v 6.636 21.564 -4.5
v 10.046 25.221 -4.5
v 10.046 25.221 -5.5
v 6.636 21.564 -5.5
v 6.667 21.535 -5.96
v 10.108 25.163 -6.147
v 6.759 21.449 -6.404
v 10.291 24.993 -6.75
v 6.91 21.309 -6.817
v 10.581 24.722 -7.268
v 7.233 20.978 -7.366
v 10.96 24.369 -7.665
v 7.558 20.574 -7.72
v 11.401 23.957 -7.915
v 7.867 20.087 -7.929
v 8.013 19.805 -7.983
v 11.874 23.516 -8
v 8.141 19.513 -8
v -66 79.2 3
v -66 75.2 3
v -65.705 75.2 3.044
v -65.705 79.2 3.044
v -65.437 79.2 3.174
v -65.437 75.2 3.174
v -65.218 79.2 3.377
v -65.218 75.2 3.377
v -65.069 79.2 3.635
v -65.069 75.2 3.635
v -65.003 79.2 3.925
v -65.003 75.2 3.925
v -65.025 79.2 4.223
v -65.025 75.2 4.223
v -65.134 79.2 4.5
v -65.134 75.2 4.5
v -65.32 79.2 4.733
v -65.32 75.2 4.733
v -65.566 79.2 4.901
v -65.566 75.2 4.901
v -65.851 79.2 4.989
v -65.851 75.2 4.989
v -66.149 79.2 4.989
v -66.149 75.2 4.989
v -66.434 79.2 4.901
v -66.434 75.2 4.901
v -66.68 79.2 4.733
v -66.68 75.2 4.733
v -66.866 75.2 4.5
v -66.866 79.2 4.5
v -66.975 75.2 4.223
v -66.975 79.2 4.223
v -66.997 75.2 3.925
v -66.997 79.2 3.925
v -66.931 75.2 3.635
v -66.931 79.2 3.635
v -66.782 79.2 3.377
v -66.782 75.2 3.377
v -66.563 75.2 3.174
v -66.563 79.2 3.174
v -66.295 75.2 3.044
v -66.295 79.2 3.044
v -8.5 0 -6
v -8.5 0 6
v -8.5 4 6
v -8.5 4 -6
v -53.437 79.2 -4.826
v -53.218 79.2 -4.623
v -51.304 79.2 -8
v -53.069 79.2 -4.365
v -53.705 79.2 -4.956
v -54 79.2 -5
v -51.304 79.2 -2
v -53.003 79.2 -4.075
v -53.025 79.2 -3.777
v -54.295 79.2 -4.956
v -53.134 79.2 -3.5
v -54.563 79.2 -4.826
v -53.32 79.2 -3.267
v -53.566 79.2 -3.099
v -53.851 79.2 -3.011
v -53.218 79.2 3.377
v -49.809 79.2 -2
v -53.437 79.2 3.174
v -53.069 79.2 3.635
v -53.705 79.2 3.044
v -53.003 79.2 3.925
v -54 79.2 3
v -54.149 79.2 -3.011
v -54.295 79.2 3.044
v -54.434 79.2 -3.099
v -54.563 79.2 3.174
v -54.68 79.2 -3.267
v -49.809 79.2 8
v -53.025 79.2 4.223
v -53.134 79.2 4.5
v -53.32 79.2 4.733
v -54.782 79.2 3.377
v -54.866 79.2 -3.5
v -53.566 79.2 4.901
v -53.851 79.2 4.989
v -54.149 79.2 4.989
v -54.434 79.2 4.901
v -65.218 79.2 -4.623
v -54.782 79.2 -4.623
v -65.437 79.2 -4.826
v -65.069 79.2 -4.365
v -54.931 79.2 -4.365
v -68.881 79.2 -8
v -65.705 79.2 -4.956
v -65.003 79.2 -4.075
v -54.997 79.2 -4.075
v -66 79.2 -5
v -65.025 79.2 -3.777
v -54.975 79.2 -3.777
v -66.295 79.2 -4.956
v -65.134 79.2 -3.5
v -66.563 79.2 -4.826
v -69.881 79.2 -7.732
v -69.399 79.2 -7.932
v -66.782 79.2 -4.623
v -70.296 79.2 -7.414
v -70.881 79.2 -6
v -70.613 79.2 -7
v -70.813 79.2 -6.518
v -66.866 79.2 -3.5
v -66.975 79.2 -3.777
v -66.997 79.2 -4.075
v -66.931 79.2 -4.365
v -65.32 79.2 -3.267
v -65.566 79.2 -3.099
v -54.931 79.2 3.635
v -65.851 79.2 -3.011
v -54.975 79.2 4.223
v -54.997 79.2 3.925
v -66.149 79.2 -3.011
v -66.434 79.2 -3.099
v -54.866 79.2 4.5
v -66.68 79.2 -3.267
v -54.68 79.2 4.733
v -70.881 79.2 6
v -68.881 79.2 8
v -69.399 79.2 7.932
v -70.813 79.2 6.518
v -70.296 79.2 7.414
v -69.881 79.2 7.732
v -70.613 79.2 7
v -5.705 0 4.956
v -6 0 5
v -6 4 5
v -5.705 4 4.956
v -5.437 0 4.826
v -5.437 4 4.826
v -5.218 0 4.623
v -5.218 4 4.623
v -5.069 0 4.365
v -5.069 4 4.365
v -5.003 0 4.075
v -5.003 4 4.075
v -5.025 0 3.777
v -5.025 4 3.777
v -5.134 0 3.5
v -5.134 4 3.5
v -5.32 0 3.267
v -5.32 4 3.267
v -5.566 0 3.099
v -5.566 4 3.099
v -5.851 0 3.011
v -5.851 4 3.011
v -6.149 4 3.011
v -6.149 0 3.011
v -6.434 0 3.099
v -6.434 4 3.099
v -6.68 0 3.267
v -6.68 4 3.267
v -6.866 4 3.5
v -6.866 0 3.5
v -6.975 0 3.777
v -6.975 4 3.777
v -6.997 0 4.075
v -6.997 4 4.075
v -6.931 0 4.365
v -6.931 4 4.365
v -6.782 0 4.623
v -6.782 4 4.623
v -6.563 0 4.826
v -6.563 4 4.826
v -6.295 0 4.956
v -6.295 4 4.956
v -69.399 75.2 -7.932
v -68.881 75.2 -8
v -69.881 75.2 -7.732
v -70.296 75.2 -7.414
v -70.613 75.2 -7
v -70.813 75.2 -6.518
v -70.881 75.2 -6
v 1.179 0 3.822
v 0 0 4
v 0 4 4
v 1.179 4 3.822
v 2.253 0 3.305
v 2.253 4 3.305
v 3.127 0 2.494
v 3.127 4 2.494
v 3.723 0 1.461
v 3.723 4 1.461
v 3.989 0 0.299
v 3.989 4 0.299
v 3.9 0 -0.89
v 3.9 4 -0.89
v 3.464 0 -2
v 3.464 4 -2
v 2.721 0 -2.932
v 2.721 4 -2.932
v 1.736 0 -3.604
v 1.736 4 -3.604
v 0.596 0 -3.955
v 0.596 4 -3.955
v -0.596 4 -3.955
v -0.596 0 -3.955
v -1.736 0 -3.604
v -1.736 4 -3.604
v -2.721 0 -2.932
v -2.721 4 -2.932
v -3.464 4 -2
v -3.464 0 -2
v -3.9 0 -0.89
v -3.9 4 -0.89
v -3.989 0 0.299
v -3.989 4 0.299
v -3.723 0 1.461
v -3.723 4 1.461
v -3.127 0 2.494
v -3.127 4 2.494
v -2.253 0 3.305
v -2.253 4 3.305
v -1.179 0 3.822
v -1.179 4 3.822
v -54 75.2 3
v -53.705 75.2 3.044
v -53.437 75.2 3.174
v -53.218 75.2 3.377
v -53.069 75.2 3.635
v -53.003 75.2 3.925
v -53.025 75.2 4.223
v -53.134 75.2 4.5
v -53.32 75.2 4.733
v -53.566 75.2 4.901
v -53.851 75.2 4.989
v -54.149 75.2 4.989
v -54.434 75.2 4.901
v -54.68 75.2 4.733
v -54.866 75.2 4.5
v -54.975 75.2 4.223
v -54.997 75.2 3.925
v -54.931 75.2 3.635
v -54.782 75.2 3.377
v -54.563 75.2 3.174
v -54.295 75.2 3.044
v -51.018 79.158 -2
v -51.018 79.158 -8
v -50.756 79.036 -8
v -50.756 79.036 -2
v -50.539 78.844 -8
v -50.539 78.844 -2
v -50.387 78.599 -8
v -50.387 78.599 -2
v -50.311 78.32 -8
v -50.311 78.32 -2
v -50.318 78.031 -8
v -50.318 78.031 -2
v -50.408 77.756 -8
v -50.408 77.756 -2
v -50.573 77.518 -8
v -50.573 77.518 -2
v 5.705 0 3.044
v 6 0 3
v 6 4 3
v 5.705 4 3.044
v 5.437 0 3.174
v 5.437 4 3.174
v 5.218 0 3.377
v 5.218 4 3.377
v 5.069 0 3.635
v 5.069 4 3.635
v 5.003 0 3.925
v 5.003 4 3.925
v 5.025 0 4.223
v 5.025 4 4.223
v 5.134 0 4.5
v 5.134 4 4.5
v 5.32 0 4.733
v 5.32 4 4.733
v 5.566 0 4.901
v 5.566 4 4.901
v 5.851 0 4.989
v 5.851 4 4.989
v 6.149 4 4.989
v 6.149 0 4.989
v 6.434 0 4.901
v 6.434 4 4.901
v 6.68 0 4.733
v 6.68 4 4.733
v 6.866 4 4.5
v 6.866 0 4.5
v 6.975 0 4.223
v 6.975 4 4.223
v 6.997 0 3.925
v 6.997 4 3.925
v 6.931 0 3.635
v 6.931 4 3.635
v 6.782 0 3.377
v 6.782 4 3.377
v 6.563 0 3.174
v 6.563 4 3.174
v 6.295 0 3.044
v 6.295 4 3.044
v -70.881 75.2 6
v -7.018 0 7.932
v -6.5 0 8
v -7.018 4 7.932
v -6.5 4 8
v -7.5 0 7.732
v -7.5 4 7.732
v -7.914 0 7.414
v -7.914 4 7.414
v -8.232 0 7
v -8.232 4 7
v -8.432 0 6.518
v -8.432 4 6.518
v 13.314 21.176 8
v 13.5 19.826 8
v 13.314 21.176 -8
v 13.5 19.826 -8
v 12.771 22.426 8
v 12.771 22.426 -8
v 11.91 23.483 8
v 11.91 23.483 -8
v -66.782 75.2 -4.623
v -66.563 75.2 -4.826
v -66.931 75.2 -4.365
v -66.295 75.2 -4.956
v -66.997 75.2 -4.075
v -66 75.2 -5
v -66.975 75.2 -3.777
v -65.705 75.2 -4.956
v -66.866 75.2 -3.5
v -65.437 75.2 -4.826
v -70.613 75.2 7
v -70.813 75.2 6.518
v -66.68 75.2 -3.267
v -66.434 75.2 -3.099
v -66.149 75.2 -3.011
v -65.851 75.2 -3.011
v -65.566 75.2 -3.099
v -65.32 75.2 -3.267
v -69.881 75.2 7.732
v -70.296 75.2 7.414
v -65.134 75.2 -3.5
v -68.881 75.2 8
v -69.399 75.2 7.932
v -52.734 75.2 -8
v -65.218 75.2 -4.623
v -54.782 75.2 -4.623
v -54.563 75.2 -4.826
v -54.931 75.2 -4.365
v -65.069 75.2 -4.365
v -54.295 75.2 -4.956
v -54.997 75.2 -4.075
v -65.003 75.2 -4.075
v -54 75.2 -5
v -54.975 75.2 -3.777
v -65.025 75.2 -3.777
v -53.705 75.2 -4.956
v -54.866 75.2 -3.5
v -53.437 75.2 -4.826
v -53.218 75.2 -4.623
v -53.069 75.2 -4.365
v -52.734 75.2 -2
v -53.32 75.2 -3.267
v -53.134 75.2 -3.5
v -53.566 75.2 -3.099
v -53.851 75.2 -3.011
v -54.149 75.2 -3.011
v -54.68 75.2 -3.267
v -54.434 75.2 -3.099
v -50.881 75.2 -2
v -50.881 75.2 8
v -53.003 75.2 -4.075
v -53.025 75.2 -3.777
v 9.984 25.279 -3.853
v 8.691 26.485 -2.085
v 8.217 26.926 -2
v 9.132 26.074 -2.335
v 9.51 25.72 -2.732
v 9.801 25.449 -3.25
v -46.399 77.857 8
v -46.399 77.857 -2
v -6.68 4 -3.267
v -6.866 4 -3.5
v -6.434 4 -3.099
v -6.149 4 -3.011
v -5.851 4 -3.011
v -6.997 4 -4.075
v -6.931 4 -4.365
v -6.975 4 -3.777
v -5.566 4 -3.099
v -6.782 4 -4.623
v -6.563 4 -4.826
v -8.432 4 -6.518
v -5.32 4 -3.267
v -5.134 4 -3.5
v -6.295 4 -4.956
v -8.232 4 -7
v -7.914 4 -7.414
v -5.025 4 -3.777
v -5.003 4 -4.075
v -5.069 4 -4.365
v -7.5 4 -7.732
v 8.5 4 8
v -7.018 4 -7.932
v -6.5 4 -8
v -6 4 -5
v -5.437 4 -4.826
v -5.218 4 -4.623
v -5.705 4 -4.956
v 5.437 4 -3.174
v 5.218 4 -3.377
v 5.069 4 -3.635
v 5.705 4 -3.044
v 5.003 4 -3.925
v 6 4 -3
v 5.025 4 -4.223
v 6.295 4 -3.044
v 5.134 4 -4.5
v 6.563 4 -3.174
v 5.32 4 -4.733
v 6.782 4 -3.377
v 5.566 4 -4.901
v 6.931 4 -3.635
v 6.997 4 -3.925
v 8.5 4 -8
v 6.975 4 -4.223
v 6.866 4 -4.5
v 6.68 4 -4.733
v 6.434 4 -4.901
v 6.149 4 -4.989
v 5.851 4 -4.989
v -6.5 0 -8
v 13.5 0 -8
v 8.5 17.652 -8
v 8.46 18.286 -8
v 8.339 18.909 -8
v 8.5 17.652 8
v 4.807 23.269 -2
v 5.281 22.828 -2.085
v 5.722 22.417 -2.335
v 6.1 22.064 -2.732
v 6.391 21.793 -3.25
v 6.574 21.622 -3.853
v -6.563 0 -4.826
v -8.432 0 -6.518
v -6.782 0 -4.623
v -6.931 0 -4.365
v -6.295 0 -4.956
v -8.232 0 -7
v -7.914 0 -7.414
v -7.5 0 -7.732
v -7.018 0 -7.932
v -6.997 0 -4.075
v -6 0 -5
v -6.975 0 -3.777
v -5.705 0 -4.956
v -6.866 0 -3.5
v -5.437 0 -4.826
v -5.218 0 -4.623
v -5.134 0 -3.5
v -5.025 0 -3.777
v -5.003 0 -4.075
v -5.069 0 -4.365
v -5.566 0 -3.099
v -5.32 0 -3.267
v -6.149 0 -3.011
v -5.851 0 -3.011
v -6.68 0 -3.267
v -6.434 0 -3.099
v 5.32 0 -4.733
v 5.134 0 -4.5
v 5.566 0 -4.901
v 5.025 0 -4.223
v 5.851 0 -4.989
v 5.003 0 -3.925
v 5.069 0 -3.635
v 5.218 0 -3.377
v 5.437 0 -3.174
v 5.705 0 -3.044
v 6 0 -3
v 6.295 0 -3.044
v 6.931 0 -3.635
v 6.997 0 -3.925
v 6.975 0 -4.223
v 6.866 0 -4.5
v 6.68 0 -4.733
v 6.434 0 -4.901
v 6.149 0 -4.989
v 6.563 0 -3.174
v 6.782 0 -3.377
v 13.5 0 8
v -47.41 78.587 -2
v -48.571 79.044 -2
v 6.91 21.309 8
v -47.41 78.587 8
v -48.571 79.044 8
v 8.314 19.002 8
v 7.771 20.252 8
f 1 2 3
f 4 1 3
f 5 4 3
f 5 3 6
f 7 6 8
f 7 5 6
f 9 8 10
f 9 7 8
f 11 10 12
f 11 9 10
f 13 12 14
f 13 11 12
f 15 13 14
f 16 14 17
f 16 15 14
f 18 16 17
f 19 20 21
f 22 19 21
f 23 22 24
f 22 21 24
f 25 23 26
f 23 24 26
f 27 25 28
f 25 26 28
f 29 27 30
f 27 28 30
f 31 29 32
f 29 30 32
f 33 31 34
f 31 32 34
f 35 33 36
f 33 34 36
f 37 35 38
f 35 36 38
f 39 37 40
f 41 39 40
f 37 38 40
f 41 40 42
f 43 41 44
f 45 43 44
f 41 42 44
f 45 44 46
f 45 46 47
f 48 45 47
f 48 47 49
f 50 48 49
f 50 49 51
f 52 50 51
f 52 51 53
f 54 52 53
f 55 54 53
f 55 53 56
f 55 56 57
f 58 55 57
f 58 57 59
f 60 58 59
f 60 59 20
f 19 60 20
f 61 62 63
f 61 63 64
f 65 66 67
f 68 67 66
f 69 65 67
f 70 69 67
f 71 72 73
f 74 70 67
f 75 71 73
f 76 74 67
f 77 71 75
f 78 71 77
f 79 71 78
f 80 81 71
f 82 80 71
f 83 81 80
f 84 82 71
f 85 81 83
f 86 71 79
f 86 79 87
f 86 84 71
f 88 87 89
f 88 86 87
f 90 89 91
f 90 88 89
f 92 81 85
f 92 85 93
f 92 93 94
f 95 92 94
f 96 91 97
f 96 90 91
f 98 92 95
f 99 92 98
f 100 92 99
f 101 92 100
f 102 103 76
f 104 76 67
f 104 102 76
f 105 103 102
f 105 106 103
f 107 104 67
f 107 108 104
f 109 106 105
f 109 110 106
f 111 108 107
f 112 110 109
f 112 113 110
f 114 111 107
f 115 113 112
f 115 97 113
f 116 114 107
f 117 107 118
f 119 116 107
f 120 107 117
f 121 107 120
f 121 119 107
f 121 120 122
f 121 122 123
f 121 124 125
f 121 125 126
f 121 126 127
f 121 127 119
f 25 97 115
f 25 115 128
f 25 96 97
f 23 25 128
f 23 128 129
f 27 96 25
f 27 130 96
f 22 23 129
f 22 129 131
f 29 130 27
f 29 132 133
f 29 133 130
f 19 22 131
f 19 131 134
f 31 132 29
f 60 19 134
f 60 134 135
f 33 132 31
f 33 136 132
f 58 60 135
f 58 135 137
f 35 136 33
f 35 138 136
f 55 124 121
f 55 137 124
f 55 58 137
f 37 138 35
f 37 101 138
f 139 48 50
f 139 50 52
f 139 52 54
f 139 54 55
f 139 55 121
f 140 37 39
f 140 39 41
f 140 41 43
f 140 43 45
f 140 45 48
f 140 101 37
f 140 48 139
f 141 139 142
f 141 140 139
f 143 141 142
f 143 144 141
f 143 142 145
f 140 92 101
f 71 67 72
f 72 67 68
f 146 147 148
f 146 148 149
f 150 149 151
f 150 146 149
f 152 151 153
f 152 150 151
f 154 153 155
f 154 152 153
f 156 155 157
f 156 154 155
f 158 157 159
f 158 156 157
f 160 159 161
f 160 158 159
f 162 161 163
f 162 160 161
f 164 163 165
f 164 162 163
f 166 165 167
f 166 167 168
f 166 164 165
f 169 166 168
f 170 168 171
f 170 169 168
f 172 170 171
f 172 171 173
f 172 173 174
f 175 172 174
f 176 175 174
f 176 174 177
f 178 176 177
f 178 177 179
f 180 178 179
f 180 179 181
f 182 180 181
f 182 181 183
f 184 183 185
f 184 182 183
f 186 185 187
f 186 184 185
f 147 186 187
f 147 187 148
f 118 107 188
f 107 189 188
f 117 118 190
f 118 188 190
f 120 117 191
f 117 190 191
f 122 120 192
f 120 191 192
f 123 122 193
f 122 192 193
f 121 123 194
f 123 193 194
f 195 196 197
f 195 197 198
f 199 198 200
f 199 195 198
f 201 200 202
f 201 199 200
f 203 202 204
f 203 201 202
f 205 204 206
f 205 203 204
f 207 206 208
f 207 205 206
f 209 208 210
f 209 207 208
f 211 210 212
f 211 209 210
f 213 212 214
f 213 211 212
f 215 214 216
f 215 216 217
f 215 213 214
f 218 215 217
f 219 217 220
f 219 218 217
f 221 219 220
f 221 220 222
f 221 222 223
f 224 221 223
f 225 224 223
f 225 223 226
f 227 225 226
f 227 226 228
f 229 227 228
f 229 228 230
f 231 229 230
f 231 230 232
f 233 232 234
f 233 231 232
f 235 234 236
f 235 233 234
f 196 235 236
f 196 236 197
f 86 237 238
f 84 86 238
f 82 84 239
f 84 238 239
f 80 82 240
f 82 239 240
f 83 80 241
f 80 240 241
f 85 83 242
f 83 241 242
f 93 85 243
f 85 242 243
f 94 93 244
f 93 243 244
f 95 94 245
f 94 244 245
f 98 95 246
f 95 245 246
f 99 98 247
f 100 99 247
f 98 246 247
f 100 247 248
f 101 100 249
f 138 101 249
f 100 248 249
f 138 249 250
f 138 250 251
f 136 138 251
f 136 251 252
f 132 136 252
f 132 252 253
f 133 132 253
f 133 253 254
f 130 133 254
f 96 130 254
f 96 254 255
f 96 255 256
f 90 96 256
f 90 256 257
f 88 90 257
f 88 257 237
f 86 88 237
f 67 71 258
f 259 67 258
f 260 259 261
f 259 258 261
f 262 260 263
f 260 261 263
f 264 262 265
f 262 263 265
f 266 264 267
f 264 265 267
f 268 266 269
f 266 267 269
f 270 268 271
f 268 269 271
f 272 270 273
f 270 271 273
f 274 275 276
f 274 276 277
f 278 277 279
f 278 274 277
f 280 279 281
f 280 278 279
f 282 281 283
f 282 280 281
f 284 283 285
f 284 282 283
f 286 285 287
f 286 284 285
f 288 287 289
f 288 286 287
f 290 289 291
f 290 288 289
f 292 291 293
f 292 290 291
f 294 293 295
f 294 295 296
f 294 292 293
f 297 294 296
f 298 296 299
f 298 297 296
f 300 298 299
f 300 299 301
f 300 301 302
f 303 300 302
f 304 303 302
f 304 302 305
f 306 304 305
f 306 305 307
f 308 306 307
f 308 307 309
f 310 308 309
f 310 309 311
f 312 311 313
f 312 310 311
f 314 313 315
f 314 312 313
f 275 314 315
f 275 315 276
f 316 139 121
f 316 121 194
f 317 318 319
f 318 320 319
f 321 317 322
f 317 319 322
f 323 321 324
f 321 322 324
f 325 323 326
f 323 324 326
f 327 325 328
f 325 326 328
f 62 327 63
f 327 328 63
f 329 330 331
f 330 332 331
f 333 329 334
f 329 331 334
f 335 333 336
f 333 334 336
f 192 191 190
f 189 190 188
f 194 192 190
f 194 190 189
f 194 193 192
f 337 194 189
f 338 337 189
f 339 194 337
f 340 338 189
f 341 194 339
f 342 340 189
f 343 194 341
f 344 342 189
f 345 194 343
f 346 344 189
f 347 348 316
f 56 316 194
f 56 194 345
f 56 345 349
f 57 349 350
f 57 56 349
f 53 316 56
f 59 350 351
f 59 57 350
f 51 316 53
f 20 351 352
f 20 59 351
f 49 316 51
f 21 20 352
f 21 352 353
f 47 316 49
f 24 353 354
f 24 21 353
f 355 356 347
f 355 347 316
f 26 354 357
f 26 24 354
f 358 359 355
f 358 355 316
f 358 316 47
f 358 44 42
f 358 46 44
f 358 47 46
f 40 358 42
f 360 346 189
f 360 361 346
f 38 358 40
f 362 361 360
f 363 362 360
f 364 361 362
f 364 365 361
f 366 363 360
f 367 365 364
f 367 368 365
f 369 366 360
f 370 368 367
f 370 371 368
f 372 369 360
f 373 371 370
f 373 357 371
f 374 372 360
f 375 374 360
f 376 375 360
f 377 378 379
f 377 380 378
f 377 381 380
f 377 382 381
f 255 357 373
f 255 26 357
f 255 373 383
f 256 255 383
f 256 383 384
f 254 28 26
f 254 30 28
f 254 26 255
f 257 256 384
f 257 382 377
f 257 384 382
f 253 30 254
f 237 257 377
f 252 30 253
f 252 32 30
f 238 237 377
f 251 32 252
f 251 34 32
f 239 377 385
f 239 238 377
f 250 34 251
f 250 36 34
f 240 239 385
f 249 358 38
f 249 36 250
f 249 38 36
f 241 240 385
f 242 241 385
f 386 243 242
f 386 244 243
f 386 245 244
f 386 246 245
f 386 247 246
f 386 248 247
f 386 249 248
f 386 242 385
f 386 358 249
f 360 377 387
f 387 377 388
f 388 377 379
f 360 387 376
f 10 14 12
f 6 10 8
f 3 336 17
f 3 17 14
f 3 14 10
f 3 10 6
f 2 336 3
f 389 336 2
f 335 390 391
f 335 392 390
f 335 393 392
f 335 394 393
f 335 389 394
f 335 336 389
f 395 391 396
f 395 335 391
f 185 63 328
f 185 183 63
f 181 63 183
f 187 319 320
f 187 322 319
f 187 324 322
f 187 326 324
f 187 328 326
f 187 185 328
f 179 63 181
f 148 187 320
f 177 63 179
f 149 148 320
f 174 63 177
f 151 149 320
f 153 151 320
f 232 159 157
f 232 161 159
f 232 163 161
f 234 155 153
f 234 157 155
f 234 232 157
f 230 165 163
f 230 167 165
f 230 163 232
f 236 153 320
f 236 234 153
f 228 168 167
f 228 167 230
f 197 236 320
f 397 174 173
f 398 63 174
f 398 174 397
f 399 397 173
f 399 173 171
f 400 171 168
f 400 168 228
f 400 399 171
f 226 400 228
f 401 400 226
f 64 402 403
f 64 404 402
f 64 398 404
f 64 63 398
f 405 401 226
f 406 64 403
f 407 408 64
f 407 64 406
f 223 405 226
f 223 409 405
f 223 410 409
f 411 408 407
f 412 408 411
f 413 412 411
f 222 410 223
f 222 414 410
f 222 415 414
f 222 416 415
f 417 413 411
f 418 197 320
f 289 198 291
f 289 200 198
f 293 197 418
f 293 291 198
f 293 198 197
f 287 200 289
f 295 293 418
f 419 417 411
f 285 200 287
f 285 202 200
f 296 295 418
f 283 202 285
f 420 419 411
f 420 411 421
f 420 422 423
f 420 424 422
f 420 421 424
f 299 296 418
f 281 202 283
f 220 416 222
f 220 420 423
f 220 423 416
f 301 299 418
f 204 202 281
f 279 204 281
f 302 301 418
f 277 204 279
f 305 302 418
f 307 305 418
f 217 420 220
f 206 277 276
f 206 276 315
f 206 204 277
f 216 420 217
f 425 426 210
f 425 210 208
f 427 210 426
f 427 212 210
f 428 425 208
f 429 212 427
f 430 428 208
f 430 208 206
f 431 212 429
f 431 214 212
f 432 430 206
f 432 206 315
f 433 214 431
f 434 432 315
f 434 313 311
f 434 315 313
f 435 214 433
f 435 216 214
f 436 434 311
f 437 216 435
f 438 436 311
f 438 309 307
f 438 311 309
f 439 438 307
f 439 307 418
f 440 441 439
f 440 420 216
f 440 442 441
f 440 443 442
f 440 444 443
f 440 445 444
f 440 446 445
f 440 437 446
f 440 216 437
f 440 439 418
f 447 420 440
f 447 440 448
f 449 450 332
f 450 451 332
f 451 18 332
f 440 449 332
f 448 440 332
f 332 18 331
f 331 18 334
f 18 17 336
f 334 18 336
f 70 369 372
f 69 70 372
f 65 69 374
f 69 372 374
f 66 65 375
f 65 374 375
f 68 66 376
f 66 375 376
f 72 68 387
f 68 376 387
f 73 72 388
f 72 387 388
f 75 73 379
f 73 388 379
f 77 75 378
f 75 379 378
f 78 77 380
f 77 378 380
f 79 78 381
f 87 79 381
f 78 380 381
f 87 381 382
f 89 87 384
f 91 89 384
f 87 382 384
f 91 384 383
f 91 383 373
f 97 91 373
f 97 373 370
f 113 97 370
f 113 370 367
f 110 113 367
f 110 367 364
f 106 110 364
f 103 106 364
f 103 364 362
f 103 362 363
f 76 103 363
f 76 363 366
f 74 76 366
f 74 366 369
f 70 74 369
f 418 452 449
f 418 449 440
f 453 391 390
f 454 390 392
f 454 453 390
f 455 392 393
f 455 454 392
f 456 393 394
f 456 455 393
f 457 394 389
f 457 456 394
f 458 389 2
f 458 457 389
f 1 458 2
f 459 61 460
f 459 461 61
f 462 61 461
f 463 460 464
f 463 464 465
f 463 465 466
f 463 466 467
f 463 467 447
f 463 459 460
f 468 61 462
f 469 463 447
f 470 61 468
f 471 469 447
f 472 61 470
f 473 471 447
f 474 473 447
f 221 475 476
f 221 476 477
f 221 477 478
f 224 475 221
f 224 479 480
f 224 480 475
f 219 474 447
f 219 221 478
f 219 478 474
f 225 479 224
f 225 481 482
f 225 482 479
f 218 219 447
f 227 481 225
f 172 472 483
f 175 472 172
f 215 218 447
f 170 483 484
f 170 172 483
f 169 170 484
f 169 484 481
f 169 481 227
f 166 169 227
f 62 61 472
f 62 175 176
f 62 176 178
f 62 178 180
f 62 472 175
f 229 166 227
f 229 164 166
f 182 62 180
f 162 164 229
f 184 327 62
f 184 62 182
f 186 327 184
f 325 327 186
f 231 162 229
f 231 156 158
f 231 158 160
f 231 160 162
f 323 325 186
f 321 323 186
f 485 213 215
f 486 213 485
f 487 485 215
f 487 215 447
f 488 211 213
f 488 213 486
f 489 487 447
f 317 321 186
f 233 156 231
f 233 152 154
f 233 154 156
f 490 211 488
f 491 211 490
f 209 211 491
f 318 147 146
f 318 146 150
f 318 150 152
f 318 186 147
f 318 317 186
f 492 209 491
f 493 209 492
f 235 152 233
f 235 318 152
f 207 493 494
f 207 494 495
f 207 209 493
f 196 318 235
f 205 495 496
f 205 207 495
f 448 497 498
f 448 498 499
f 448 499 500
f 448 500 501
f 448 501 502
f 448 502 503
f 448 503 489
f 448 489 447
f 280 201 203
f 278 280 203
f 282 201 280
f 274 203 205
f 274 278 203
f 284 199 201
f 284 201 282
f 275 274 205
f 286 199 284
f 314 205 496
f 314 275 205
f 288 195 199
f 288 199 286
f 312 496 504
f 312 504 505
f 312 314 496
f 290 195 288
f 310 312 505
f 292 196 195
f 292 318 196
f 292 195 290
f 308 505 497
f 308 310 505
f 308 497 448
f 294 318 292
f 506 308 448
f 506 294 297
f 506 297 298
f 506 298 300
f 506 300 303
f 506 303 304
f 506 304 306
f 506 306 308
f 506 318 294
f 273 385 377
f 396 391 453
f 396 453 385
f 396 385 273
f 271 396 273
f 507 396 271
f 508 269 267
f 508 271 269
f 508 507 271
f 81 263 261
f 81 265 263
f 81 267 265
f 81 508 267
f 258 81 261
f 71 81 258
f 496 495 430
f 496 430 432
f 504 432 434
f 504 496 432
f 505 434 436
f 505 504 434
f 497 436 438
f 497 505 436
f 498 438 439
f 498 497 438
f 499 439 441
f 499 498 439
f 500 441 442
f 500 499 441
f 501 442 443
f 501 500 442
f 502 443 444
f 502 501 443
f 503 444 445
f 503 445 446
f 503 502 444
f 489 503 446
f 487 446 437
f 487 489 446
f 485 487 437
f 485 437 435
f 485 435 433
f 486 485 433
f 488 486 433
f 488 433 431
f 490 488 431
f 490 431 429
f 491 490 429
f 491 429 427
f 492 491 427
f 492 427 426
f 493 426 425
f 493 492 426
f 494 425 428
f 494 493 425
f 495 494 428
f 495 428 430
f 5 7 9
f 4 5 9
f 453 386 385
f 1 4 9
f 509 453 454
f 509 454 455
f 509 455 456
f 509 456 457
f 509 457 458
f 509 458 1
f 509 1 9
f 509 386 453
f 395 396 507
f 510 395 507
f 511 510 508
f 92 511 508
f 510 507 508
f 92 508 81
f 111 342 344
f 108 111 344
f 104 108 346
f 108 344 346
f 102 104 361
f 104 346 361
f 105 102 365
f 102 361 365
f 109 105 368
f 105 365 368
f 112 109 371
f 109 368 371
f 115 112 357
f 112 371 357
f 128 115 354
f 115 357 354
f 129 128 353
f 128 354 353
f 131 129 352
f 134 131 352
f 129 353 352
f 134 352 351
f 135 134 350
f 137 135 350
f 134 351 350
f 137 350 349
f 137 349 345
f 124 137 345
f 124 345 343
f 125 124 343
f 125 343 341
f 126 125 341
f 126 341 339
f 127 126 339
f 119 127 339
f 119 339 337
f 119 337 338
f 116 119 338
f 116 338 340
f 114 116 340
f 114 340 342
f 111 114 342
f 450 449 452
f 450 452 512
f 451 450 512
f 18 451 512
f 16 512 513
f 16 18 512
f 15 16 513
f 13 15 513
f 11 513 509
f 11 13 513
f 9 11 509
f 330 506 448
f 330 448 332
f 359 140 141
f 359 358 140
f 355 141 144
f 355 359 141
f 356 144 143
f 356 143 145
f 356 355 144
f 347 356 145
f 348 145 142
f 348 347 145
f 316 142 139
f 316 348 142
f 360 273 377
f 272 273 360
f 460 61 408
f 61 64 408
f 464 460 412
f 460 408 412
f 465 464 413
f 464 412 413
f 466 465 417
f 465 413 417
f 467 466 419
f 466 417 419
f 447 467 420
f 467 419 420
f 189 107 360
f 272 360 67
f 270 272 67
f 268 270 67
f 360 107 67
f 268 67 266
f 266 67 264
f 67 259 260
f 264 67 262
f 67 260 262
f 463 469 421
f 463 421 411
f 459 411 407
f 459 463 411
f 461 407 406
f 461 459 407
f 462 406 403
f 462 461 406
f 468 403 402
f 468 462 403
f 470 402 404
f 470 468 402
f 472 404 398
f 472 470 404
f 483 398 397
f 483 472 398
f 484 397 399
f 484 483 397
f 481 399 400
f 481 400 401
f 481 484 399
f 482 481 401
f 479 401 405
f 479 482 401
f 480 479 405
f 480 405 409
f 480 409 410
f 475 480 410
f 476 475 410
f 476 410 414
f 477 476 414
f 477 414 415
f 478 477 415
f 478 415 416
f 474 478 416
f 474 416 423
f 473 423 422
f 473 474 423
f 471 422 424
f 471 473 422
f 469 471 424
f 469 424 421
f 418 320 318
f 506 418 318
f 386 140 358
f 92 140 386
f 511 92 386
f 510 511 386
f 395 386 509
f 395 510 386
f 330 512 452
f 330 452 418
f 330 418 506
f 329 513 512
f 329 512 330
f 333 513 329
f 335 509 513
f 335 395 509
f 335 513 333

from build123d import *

# Parameters (mm, degrees)
SKETCH_1_W          = 17
SKETCH_1_H          = 16
SKETCH_1_R          = 1
SKETCH_1_R_2        = 4
EXTRUDE_1_DEPTH     = 4
EXTRUDE_2_DEPTH     = 16
SKETCH_4_R          = 1
CUT_EXTRUDE_1_DEPTH = 16
FILLET_1_R          = 2
FILLET_2_R          = 5
SKETCH_7_W          = 6
SKETCH_7_H          = 80
CUT_EXTRUDE_2_DEPTH = 10
FILLET_3_R          = 1
FILLET_4_R          = 2.5


with BuildPart() as part:
    # 草图1 → 凸台-拉伸1 (new body)
    with BuildSketch(Plane(origin=(0, 0, 0), x_dir=(1, 0, 0), z_dir=(0, 1, 0))):
        Rectangle(SKETCH_1_W, SKETCH_1_H)
        with Locations(Location((6, 4, 0), (0, 0, 270))):
            Circle(SKETCH_1_R, mode=Mode.SUBTRACT)
        with Locations(Location((-6, 4, 0), (0, 0, 90))):
            Circle(SKETCH_1_R, mode=Mode.SUBTRACT)
        with Locations(Location((6, -4, 0), (0, 0, 90))):
            Circle(SKETCH_1_R, mode=Mode.SUBTRACT)
        with Locations(Location((-6, -4, 0), (0, 0, 270))):
            Circle(SKETCH_1_R, mode=Mode.SUBTRACT)
        with Locations(Location((0, 0, 0), (0, 0, 270))):
            Circle(SKETCH_1_R_2, mode=Mode.SUBTRACT)
    extrude(amount=EXTRUDE_1_DEPTH)

    # 草图2 → 凸台-拉伸2 (add)
    with BuildSketch(Plane.XY.offset(8)):
        Polygon((8.5, 4.825938125), (8.5, 0), (13.5, 0), (13.5, 22), (-47.839490213, 79.2), (-50.691220222, 79.2), (-70.881411302, 79.2), (-70.881411302, 75.2), (-51, 75.2), (-50.881411302, 75.2), (8.5, 19.825938125), align=None)
    extrude(amount=-EXTRUDE_2_DEPTH)

    # 草图4 → 切除-拉伸1 (cut)
    with BuildSketch(Plane.XZ.offset(-75.2)):
        with Locations(Location((-54, 4, 0), (0, 0, 270))):
            Circle(SKETCH_4_R)
        with Locations(Location((-54, -4, 0), (0, 0, 270))):
            Circle(SKETCH_4_R)
        with Locations(Location((-66, -4, 0), (0, 0, 270))):
            Circle(SKETCH_4_R)
        with Locations(Location((-66, 4, 0), (0, 0, 270))):
            Circle(SKETCH_4_R)
    extrude(amount=-CUT_EXTRUDE_1_DEPTH, mode=Mode.SUBTRACT)

    # 圆角1
    fillet_1_edges = [part.edges().sort_by_distance(p)[0] for p in [
        (-70.881411302, 77.2, -8),
        (-70.881411302, 77.2, 8),
        (-8.5, 2, 8),
        (-8.5, 2, -8),
    ]]
    fillet(fillet_1_edges, radius=FILLET_1_R)

    # 圆角2
    fillet_2_edges = [part.edges().sort_by_distance(p)[0] for p in [
        (8.5, 19.825938125, 0),
        (-47.839490213, 79.2, 0),
        (13.5, 22, 0),
    ]]
    fillet(fillet_2_edges, radius=FILLET_2_R)

    # 草图7 → 切除-拉伸2 (cut)
    with BuildSketch(Plane(origin=(17.252348355, 18.50087855, 0), x_dir=(0, 0, -1), z_dir=(0.6819983600624965, 0.7313537016191725, 0))):
        with Locations((5, 49.853652648)):
            Rectangle(SKETCH_7_W, SKETCH_7_H)
    extrude(amount=-CUT_EXTRUDE_2_DEPTH, mode=Mode.SUBTRACT)

    # 圆角3
    # the kernel refuses this fillet: 1 mm, written as the material it takes off along each edge
    with BuildSketch(Plane(origin=(-49.057187154, 79.143148127, -2), x_dir=(-0.9996800282081353, 0.02529508256127706, 0), z_dir=(0, 0, -1))) as fillet_3_piece_1:
        with BuildLine():
            CenterArc((2.222251386, -0.999680028), FILLET_3_R, 88.550543928, 133)
            Line((1.473880493, -1.662960516), (1.399043403, -1.729288565))
            Line((1.399043403, -1.729288565), (-0.074837089, -0.066328049))
            Line((-0.074837089, -0.066328049), (-0.012531551, 0.099211694))
            ThreePointArc((-0.012531551, 0.099211694), (0.755582446, 0.13778344), (2.250075977, 0.099968003))
            Line((2.250075977, 0.099968003), (2.247546469, 0))
        make_face()
    extrude(amount=11.618866172, mode=Mode.SUBTRACT)

    # 圆角4
    fillet_4_edges = [part.edges().sort_by_distance(p)[0] for p in [
        (8.340847116, 23.392669243, -2),
        (8.340847116, 23.392669243, -8),
    ]]
    fillet(fillet_4_edges, radius=FILLET_4_R)


solid = part.part
